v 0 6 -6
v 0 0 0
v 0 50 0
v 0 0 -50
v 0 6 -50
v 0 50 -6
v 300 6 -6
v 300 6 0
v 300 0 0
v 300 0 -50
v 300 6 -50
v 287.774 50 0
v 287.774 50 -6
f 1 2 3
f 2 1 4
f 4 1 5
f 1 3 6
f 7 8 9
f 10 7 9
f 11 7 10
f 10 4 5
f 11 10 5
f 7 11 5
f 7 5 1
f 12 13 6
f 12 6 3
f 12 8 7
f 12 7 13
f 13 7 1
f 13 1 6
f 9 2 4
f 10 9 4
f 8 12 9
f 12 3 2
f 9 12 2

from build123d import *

# Parameters (mm, degrees)
EXTRUDE_1_DEPTH     = 300
CUT_EXTRUDE_1_DEPTH = 51


with BuildPart() as part:
    # Эскиз1 → Вытянуть-Тонкостенный1 (new body)
    with BuildSketch(Plane(origin=(0, 0, 0), x_dir=(0, 0, -1), z_dir=(1, 0, 0))):
        Polygon((0, 50), (0, 0), (50, 0), (50, 6), (6, 6), (6, 50), align=None)
    extrude(amount=EXTRUDE_1_DEPTH)

    # Эскиз2 → Вырез-Вытянуть1 (cut, through all)
    with BuildSketch(Plane.XY):
        Polygon((287.773512033, 50), (300, 50), (300, 6), align=None)
    extrude(amount=-CUT_EXTRUDE_1_DEPTH, mode=Mode.SUBTRACT)


solid = part.part
